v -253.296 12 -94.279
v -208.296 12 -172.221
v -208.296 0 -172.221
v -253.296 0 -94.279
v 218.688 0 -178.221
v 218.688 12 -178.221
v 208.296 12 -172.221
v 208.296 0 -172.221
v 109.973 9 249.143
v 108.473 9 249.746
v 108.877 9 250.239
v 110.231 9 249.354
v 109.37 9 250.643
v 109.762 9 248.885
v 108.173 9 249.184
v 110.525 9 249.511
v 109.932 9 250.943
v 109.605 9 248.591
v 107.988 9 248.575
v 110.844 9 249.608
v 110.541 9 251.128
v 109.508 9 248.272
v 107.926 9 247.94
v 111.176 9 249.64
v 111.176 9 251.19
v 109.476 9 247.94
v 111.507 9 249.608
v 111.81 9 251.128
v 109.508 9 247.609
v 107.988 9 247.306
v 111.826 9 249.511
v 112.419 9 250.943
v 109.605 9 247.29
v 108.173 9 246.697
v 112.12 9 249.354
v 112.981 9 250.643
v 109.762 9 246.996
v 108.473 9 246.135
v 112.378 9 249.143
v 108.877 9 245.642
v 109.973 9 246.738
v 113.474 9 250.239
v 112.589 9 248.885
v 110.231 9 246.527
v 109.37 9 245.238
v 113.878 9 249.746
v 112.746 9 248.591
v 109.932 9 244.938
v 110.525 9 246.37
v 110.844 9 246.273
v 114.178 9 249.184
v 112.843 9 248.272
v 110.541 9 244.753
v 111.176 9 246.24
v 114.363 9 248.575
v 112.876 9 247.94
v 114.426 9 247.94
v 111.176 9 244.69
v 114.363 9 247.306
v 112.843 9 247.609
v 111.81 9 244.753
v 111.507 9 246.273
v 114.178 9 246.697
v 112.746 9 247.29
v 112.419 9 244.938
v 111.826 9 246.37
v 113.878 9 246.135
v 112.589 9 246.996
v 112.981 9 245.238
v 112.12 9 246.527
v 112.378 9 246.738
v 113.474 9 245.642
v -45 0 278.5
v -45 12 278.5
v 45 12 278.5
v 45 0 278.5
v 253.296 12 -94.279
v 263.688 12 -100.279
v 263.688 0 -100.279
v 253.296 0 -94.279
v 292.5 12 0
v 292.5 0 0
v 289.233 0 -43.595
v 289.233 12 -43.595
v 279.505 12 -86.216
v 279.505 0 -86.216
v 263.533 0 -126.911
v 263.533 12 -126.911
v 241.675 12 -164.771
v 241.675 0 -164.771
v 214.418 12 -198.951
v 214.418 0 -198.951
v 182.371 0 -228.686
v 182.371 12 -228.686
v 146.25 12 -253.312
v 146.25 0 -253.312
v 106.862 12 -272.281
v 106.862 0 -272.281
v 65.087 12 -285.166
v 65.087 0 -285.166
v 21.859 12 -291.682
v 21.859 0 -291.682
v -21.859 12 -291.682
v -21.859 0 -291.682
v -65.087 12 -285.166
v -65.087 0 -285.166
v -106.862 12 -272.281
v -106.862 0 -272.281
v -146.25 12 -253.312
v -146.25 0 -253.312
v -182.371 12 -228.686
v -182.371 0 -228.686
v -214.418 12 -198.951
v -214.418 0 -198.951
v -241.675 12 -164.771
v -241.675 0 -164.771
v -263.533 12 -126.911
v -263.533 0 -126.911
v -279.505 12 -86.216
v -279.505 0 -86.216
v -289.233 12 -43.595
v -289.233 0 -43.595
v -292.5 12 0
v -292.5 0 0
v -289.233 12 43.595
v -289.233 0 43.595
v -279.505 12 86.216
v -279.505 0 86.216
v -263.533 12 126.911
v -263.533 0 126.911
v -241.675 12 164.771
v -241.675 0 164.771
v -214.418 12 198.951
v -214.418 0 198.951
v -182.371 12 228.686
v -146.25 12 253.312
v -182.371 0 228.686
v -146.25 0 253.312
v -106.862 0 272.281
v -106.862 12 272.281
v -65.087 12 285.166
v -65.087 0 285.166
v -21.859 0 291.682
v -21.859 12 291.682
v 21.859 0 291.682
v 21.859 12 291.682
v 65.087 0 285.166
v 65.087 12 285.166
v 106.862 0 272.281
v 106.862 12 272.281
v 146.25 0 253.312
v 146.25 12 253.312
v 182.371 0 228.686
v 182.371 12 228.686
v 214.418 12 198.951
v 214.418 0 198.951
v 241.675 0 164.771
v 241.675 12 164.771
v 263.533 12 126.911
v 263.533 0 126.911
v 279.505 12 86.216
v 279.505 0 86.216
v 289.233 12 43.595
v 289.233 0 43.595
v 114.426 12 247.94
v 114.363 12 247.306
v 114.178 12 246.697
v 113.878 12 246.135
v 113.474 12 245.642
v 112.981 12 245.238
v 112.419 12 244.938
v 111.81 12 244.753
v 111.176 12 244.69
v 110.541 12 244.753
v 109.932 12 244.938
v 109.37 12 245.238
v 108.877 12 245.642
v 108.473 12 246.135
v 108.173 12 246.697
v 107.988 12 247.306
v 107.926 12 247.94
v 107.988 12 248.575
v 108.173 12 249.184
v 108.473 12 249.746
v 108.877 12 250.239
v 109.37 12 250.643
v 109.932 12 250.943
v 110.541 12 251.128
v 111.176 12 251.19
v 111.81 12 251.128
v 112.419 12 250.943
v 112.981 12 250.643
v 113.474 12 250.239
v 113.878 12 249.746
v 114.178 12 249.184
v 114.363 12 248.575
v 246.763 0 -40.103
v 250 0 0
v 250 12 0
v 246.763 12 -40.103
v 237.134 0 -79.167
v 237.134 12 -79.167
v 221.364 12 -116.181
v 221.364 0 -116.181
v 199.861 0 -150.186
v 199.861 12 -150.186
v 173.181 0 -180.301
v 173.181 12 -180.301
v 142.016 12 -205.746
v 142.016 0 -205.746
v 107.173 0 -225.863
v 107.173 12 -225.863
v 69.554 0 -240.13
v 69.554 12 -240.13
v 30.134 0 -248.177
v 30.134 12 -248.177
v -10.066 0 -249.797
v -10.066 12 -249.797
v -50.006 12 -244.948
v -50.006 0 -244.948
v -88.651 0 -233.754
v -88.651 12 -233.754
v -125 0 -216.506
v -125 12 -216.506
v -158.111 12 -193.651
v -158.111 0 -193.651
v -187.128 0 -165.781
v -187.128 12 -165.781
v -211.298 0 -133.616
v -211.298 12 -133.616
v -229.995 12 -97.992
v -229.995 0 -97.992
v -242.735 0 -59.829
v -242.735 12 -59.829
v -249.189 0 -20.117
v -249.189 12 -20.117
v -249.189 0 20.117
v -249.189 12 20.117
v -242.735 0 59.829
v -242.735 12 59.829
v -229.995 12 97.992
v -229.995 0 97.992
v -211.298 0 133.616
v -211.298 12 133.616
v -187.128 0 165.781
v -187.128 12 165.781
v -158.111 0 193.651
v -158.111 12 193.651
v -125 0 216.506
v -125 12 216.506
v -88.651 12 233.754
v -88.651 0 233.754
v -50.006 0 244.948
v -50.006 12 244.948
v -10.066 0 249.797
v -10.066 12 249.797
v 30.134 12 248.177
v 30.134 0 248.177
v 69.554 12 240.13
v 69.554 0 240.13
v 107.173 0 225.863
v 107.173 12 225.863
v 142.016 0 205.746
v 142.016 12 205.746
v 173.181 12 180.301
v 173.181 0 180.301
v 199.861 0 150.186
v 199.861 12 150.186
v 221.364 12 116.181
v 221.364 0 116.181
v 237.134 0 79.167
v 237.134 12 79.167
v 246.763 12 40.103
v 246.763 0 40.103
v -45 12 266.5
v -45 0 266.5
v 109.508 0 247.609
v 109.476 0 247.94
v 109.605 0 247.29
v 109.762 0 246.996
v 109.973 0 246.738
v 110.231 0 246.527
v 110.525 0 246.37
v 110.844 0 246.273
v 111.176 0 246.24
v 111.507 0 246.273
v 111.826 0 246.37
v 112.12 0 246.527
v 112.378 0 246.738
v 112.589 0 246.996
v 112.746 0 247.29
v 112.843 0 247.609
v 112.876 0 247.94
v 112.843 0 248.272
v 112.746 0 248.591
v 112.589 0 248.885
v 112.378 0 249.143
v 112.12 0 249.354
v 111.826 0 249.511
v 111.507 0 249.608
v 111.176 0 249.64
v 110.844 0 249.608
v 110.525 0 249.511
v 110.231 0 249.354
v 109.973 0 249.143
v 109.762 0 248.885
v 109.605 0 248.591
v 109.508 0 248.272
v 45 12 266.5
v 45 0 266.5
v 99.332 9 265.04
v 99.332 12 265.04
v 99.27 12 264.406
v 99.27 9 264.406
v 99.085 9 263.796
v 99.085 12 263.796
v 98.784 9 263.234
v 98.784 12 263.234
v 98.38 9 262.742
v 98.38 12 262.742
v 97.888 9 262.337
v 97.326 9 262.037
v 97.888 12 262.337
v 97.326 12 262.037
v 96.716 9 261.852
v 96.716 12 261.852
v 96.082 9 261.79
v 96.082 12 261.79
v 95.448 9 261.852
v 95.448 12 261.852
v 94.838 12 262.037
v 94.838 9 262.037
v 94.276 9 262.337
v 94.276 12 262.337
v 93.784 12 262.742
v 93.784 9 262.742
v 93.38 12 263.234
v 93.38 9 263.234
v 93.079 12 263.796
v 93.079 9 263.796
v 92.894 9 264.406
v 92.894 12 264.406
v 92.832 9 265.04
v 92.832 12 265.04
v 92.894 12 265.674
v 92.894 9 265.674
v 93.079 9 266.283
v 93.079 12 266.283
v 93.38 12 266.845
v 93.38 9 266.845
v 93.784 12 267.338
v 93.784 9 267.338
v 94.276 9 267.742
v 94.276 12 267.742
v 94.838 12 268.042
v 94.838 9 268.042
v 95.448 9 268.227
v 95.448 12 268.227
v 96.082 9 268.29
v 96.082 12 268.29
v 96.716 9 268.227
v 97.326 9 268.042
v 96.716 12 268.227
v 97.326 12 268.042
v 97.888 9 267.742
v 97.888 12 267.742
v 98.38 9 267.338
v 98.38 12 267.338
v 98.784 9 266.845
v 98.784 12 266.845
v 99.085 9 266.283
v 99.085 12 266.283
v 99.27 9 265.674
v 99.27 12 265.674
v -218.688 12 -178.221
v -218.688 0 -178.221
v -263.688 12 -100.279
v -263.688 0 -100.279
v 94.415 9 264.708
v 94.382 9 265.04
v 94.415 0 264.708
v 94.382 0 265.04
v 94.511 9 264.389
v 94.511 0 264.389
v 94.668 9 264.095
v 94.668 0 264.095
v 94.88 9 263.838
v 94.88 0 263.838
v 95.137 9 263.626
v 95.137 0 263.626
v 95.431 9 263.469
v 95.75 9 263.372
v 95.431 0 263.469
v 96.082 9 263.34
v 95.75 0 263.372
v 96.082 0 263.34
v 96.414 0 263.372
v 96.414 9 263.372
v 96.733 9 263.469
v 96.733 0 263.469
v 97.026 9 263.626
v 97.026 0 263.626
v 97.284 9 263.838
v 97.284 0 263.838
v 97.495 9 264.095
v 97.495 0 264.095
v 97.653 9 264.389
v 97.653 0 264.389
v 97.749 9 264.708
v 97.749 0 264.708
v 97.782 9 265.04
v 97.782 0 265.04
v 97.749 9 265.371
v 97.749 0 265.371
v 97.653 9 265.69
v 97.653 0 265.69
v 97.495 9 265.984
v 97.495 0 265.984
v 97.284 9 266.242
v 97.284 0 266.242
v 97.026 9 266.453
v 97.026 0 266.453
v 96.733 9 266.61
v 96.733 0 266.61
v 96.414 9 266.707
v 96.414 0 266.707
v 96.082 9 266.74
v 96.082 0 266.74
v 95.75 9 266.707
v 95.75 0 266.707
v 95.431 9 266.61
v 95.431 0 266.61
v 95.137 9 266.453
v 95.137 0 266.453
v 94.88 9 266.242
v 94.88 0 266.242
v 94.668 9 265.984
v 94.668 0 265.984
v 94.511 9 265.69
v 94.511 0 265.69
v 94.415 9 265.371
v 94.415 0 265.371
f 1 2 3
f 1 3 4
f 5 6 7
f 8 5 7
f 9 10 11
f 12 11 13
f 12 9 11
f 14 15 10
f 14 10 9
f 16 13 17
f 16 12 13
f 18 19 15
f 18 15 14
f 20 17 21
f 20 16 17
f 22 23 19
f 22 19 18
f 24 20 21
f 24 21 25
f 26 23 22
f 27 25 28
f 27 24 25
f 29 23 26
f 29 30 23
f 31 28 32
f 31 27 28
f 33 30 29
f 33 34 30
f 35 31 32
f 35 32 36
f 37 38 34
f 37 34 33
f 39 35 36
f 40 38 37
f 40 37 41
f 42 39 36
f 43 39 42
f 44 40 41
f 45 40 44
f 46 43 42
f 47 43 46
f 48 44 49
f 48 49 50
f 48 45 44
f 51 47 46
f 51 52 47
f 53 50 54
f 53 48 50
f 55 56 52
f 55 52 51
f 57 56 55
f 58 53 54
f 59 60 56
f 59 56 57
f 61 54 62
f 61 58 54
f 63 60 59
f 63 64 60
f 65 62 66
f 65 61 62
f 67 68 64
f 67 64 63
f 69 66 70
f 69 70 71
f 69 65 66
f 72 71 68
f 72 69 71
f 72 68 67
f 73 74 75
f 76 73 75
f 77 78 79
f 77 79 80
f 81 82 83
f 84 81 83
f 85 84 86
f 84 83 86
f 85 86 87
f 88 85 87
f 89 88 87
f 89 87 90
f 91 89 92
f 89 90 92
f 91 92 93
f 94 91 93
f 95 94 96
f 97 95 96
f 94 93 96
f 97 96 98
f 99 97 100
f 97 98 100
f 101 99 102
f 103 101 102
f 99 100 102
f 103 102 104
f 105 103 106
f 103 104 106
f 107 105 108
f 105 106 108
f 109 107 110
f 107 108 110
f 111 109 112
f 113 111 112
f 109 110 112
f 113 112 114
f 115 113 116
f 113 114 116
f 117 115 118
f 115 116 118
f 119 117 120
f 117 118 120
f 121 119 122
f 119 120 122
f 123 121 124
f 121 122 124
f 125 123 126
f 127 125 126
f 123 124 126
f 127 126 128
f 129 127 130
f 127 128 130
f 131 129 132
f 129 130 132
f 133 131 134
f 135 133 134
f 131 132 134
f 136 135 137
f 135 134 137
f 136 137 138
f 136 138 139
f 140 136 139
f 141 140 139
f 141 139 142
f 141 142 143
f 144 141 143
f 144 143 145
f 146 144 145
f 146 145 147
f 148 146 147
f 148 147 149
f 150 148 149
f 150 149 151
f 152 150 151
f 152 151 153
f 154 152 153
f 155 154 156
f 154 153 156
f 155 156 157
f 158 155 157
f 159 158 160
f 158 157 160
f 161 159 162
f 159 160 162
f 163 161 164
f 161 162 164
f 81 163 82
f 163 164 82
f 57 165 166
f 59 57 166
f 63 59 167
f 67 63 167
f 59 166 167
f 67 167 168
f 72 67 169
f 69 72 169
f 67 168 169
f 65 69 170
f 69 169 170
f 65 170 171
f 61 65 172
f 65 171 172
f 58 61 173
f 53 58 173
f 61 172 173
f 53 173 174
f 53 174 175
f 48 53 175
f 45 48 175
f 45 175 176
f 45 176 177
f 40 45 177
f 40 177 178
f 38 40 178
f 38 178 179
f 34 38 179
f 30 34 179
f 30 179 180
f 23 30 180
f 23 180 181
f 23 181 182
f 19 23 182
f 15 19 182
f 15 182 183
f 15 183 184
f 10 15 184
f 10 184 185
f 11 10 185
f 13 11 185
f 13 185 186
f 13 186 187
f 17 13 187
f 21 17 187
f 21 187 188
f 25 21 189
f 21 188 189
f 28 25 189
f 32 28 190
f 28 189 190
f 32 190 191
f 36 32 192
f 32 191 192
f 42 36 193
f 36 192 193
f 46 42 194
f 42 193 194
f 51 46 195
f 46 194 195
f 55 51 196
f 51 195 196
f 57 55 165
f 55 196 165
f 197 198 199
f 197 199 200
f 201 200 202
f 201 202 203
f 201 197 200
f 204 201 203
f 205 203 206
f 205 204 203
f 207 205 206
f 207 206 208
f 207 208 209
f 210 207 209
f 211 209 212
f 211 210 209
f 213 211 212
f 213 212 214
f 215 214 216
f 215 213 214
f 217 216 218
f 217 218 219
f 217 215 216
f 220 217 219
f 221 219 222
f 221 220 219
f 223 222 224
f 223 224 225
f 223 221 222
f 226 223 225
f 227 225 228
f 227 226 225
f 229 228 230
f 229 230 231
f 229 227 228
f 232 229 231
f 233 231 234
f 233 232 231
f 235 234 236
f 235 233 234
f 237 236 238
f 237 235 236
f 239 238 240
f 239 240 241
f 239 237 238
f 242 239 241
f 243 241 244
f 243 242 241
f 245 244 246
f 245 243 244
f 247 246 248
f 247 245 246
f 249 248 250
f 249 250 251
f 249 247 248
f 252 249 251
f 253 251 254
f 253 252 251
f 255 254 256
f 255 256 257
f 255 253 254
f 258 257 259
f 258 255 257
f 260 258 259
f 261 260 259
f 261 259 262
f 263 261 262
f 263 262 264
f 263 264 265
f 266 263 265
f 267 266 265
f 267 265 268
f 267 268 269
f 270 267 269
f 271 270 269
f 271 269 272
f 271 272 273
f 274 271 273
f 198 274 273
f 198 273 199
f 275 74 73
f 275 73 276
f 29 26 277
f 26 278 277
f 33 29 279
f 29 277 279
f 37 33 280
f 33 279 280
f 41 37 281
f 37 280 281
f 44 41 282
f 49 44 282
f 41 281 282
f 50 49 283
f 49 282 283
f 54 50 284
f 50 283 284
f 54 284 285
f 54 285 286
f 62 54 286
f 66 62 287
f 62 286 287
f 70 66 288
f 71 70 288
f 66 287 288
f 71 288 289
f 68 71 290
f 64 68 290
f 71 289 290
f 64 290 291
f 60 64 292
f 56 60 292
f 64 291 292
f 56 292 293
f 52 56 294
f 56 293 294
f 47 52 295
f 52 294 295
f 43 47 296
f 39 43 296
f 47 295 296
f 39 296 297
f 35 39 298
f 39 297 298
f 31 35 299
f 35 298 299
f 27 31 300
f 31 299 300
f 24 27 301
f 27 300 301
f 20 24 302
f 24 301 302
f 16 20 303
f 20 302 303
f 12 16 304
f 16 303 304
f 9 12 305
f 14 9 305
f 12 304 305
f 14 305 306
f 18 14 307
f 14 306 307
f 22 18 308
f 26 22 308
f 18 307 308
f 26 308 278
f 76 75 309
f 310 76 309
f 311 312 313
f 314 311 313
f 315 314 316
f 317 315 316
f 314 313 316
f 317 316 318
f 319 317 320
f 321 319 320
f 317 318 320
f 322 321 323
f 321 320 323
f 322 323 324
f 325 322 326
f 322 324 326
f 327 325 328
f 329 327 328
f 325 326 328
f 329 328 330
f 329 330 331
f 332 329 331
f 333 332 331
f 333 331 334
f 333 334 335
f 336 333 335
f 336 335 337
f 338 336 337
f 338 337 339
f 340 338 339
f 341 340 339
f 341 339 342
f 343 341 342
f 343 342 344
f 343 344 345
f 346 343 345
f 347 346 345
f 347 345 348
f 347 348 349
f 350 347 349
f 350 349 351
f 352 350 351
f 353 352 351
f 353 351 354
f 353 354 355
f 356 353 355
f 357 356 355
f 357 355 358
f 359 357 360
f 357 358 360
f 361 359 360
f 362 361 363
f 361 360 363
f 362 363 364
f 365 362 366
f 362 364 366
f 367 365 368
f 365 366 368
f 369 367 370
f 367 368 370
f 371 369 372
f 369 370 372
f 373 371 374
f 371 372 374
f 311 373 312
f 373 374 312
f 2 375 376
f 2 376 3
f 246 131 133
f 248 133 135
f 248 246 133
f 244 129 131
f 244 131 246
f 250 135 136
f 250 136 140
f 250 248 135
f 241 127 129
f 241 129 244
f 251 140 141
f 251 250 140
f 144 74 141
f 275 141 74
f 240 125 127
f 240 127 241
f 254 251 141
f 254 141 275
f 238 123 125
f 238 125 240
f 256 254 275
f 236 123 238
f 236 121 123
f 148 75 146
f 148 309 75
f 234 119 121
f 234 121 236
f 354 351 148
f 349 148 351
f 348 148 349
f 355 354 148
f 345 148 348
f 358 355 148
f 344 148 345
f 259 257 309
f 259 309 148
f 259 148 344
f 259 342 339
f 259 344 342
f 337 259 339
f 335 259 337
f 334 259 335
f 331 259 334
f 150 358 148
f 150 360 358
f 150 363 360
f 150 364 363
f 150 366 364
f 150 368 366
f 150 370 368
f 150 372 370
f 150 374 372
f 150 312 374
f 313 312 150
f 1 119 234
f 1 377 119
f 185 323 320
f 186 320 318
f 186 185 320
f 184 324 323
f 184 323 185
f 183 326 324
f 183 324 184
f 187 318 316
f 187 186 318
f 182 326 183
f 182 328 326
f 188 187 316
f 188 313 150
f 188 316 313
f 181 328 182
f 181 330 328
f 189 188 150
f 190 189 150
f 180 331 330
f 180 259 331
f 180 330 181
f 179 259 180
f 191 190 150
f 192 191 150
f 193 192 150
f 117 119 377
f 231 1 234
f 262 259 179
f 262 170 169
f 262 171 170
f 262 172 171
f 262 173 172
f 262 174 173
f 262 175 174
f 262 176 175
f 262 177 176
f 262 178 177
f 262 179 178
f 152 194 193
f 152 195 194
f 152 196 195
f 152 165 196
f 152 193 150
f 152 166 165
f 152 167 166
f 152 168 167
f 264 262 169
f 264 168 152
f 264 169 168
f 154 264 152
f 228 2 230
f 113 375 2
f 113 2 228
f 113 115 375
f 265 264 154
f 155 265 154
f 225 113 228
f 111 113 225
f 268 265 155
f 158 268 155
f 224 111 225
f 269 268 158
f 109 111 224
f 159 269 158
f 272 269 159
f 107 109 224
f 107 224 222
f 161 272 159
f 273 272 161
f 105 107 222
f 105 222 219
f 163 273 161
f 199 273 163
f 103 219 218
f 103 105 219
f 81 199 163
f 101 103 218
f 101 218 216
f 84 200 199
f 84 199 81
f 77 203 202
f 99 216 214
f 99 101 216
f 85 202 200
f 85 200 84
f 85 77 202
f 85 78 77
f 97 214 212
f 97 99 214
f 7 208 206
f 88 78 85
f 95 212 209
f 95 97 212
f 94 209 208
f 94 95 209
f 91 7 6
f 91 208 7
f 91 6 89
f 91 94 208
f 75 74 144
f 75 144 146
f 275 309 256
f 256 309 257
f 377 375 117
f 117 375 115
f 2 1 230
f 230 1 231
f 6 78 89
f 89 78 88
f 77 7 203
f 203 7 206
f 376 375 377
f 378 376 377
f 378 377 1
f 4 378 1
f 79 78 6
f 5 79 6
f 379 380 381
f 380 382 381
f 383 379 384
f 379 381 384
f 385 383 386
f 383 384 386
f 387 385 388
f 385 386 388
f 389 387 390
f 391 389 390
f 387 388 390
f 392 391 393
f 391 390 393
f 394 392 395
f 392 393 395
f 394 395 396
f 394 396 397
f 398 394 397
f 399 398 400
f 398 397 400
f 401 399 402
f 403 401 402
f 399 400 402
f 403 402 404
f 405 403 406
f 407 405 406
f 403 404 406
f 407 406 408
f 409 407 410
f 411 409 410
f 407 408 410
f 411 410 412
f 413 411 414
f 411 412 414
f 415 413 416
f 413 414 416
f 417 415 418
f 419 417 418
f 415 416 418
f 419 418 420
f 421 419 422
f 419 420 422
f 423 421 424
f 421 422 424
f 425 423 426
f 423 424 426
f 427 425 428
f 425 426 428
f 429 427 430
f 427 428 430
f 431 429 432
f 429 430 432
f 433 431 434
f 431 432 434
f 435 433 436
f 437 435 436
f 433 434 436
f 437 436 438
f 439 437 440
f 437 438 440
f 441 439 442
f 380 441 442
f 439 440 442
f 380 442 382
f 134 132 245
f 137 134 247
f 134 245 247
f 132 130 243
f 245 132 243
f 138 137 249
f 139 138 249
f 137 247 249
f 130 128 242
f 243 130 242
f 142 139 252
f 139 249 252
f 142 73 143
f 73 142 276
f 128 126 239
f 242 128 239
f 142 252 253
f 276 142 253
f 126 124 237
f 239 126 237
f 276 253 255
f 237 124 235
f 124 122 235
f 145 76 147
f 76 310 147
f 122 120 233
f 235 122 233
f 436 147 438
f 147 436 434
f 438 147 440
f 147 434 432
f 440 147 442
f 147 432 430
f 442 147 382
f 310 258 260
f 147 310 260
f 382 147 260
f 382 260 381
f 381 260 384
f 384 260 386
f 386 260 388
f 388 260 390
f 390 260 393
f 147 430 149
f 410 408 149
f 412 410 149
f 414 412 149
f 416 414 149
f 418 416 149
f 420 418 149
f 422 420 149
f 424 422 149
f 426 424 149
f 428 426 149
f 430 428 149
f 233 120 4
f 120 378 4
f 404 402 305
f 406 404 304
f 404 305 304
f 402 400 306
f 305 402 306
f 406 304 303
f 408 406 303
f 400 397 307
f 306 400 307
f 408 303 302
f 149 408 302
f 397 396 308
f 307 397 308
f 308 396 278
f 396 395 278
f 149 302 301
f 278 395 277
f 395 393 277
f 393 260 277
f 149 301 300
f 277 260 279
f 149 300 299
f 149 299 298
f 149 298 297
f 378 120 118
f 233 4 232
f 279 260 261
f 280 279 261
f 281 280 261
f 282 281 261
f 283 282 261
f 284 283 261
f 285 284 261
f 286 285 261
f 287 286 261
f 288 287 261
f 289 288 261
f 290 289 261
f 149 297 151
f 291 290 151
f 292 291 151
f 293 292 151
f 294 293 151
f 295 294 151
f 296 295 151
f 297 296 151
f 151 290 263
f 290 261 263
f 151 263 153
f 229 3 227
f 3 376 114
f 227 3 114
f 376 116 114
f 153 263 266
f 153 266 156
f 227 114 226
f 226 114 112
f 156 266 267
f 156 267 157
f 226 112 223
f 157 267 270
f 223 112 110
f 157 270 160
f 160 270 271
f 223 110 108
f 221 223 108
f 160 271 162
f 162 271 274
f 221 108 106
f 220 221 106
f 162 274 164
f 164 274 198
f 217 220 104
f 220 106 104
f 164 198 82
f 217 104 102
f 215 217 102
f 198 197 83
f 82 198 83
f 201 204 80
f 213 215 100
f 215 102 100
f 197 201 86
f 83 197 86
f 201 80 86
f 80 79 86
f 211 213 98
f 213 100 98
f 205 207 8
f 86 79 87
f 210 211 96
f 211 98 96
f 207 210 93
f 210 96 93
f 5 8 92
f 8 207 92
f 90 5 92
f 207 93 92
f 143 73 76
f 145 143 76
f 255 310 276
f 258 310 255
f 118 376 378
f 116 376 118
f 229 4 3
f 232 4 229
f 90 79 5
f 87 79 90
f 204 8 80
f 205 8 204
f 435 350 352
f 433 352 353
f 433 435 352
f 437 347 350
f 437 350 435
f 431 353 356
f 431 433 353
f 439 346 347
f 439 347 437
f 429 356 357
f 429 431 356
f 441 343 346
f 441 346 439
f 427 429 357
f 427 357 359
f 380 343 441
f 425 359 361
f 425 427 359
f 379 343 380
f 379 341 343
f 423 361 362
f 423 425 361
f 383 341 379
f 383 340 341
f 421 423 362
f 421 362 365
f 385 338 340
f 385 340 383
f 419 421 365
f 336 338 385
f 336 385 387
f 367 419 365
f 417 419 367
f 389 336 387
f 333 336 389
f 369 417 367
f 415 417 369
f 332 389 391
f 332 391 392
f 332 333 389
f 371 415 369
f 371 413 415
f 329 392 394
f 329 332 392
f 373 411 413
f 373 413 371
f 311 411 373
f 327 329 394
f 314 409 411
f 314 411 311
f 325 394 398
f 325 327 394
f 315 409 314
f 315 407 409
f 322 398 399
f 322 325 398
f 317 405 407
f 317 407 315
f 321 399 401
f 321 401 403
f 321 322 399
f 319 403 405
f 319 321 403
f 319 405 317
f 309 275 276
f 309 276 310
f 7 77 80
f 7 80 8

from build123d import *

# Parameters (mm, degrees)
SKETCH1_R                      = 292.5
SKETCH1_R_2                    = 250
BOSS_EXTRUDE1_DEPTH            = 12
SKETCH2_W                      = 90
SKETCH2_H                      = 12
CUT_EXTRUDE1_DEPTH             = 12
CIRPATTERN1_COUNT              = 3
CBORE_FOR_M3_SHCS1_D           = 3.4
CBORE_FOR_M3_SHCS1_CBORE_D     = 6.5
CBORE_FOR_M3_SHCS1_CBORE_DEPTH = 3


with BuildPart() as part:
    # Sketch1 → Boss-Extrude1 (new body)
    with BuildSketch(Plane(origin=(0, 0, 0), x_dir=(1, 0, 0), z_dir=(0, 1, 0))):
        Circle(SKETCH1_R)
        Circle(SKETCH1_R_2, mode=Mode.SUBTRACT)
    extrude(amount=BOSS_EXTRUDE1_DEPTH)

    # Sketch2 → Cut-Extrude1 (cut)
    with BuildSketch(Plane(origin=(0, 12, 0), x_dir=(1, 0, 0), z_dir=(0, 1, 0))):
        with Locations((0, -272.5)):
            Rectangle(SKETCH2_W, SKETCH2_H)
    cut_extrude1 = extrude(amount=-CUT_EXTRUDE1_DEPTH, mode=Mode.SUBTRACT)

    # CirPattern1: Cut-Extrude1 ×3 about axis
    cirpattern1_axis = Axis((0, 0, 0), (0, 1, 0))
    for i in range(1, CIRPATTERN1_COUNT):
        add(cut_extrude1.rotate(cirpattern1_axis, i * 360 / CIRPATTERN1_COUNT), mode=Mode.SUBTRACT)

    # CBORE for M3 SHCS1 (through all)
    with Locations(Plane(origin=(0, 12, 0), x_dir=(1, 0, 0), z_dir=(0, 1, 0))):
        with Locations((111.175516554, -247.940494387), (96.081953174, -265.03974421)):
            CounterBoreHole(CBORE_FOR_M3_SHCS1_D / 2, CBORE_FOR_M3_SHCS1_CBORE_D / 2, CBORE_FOR_M3_SHCS1_CBORE_DEPTH)


solid = part.part
